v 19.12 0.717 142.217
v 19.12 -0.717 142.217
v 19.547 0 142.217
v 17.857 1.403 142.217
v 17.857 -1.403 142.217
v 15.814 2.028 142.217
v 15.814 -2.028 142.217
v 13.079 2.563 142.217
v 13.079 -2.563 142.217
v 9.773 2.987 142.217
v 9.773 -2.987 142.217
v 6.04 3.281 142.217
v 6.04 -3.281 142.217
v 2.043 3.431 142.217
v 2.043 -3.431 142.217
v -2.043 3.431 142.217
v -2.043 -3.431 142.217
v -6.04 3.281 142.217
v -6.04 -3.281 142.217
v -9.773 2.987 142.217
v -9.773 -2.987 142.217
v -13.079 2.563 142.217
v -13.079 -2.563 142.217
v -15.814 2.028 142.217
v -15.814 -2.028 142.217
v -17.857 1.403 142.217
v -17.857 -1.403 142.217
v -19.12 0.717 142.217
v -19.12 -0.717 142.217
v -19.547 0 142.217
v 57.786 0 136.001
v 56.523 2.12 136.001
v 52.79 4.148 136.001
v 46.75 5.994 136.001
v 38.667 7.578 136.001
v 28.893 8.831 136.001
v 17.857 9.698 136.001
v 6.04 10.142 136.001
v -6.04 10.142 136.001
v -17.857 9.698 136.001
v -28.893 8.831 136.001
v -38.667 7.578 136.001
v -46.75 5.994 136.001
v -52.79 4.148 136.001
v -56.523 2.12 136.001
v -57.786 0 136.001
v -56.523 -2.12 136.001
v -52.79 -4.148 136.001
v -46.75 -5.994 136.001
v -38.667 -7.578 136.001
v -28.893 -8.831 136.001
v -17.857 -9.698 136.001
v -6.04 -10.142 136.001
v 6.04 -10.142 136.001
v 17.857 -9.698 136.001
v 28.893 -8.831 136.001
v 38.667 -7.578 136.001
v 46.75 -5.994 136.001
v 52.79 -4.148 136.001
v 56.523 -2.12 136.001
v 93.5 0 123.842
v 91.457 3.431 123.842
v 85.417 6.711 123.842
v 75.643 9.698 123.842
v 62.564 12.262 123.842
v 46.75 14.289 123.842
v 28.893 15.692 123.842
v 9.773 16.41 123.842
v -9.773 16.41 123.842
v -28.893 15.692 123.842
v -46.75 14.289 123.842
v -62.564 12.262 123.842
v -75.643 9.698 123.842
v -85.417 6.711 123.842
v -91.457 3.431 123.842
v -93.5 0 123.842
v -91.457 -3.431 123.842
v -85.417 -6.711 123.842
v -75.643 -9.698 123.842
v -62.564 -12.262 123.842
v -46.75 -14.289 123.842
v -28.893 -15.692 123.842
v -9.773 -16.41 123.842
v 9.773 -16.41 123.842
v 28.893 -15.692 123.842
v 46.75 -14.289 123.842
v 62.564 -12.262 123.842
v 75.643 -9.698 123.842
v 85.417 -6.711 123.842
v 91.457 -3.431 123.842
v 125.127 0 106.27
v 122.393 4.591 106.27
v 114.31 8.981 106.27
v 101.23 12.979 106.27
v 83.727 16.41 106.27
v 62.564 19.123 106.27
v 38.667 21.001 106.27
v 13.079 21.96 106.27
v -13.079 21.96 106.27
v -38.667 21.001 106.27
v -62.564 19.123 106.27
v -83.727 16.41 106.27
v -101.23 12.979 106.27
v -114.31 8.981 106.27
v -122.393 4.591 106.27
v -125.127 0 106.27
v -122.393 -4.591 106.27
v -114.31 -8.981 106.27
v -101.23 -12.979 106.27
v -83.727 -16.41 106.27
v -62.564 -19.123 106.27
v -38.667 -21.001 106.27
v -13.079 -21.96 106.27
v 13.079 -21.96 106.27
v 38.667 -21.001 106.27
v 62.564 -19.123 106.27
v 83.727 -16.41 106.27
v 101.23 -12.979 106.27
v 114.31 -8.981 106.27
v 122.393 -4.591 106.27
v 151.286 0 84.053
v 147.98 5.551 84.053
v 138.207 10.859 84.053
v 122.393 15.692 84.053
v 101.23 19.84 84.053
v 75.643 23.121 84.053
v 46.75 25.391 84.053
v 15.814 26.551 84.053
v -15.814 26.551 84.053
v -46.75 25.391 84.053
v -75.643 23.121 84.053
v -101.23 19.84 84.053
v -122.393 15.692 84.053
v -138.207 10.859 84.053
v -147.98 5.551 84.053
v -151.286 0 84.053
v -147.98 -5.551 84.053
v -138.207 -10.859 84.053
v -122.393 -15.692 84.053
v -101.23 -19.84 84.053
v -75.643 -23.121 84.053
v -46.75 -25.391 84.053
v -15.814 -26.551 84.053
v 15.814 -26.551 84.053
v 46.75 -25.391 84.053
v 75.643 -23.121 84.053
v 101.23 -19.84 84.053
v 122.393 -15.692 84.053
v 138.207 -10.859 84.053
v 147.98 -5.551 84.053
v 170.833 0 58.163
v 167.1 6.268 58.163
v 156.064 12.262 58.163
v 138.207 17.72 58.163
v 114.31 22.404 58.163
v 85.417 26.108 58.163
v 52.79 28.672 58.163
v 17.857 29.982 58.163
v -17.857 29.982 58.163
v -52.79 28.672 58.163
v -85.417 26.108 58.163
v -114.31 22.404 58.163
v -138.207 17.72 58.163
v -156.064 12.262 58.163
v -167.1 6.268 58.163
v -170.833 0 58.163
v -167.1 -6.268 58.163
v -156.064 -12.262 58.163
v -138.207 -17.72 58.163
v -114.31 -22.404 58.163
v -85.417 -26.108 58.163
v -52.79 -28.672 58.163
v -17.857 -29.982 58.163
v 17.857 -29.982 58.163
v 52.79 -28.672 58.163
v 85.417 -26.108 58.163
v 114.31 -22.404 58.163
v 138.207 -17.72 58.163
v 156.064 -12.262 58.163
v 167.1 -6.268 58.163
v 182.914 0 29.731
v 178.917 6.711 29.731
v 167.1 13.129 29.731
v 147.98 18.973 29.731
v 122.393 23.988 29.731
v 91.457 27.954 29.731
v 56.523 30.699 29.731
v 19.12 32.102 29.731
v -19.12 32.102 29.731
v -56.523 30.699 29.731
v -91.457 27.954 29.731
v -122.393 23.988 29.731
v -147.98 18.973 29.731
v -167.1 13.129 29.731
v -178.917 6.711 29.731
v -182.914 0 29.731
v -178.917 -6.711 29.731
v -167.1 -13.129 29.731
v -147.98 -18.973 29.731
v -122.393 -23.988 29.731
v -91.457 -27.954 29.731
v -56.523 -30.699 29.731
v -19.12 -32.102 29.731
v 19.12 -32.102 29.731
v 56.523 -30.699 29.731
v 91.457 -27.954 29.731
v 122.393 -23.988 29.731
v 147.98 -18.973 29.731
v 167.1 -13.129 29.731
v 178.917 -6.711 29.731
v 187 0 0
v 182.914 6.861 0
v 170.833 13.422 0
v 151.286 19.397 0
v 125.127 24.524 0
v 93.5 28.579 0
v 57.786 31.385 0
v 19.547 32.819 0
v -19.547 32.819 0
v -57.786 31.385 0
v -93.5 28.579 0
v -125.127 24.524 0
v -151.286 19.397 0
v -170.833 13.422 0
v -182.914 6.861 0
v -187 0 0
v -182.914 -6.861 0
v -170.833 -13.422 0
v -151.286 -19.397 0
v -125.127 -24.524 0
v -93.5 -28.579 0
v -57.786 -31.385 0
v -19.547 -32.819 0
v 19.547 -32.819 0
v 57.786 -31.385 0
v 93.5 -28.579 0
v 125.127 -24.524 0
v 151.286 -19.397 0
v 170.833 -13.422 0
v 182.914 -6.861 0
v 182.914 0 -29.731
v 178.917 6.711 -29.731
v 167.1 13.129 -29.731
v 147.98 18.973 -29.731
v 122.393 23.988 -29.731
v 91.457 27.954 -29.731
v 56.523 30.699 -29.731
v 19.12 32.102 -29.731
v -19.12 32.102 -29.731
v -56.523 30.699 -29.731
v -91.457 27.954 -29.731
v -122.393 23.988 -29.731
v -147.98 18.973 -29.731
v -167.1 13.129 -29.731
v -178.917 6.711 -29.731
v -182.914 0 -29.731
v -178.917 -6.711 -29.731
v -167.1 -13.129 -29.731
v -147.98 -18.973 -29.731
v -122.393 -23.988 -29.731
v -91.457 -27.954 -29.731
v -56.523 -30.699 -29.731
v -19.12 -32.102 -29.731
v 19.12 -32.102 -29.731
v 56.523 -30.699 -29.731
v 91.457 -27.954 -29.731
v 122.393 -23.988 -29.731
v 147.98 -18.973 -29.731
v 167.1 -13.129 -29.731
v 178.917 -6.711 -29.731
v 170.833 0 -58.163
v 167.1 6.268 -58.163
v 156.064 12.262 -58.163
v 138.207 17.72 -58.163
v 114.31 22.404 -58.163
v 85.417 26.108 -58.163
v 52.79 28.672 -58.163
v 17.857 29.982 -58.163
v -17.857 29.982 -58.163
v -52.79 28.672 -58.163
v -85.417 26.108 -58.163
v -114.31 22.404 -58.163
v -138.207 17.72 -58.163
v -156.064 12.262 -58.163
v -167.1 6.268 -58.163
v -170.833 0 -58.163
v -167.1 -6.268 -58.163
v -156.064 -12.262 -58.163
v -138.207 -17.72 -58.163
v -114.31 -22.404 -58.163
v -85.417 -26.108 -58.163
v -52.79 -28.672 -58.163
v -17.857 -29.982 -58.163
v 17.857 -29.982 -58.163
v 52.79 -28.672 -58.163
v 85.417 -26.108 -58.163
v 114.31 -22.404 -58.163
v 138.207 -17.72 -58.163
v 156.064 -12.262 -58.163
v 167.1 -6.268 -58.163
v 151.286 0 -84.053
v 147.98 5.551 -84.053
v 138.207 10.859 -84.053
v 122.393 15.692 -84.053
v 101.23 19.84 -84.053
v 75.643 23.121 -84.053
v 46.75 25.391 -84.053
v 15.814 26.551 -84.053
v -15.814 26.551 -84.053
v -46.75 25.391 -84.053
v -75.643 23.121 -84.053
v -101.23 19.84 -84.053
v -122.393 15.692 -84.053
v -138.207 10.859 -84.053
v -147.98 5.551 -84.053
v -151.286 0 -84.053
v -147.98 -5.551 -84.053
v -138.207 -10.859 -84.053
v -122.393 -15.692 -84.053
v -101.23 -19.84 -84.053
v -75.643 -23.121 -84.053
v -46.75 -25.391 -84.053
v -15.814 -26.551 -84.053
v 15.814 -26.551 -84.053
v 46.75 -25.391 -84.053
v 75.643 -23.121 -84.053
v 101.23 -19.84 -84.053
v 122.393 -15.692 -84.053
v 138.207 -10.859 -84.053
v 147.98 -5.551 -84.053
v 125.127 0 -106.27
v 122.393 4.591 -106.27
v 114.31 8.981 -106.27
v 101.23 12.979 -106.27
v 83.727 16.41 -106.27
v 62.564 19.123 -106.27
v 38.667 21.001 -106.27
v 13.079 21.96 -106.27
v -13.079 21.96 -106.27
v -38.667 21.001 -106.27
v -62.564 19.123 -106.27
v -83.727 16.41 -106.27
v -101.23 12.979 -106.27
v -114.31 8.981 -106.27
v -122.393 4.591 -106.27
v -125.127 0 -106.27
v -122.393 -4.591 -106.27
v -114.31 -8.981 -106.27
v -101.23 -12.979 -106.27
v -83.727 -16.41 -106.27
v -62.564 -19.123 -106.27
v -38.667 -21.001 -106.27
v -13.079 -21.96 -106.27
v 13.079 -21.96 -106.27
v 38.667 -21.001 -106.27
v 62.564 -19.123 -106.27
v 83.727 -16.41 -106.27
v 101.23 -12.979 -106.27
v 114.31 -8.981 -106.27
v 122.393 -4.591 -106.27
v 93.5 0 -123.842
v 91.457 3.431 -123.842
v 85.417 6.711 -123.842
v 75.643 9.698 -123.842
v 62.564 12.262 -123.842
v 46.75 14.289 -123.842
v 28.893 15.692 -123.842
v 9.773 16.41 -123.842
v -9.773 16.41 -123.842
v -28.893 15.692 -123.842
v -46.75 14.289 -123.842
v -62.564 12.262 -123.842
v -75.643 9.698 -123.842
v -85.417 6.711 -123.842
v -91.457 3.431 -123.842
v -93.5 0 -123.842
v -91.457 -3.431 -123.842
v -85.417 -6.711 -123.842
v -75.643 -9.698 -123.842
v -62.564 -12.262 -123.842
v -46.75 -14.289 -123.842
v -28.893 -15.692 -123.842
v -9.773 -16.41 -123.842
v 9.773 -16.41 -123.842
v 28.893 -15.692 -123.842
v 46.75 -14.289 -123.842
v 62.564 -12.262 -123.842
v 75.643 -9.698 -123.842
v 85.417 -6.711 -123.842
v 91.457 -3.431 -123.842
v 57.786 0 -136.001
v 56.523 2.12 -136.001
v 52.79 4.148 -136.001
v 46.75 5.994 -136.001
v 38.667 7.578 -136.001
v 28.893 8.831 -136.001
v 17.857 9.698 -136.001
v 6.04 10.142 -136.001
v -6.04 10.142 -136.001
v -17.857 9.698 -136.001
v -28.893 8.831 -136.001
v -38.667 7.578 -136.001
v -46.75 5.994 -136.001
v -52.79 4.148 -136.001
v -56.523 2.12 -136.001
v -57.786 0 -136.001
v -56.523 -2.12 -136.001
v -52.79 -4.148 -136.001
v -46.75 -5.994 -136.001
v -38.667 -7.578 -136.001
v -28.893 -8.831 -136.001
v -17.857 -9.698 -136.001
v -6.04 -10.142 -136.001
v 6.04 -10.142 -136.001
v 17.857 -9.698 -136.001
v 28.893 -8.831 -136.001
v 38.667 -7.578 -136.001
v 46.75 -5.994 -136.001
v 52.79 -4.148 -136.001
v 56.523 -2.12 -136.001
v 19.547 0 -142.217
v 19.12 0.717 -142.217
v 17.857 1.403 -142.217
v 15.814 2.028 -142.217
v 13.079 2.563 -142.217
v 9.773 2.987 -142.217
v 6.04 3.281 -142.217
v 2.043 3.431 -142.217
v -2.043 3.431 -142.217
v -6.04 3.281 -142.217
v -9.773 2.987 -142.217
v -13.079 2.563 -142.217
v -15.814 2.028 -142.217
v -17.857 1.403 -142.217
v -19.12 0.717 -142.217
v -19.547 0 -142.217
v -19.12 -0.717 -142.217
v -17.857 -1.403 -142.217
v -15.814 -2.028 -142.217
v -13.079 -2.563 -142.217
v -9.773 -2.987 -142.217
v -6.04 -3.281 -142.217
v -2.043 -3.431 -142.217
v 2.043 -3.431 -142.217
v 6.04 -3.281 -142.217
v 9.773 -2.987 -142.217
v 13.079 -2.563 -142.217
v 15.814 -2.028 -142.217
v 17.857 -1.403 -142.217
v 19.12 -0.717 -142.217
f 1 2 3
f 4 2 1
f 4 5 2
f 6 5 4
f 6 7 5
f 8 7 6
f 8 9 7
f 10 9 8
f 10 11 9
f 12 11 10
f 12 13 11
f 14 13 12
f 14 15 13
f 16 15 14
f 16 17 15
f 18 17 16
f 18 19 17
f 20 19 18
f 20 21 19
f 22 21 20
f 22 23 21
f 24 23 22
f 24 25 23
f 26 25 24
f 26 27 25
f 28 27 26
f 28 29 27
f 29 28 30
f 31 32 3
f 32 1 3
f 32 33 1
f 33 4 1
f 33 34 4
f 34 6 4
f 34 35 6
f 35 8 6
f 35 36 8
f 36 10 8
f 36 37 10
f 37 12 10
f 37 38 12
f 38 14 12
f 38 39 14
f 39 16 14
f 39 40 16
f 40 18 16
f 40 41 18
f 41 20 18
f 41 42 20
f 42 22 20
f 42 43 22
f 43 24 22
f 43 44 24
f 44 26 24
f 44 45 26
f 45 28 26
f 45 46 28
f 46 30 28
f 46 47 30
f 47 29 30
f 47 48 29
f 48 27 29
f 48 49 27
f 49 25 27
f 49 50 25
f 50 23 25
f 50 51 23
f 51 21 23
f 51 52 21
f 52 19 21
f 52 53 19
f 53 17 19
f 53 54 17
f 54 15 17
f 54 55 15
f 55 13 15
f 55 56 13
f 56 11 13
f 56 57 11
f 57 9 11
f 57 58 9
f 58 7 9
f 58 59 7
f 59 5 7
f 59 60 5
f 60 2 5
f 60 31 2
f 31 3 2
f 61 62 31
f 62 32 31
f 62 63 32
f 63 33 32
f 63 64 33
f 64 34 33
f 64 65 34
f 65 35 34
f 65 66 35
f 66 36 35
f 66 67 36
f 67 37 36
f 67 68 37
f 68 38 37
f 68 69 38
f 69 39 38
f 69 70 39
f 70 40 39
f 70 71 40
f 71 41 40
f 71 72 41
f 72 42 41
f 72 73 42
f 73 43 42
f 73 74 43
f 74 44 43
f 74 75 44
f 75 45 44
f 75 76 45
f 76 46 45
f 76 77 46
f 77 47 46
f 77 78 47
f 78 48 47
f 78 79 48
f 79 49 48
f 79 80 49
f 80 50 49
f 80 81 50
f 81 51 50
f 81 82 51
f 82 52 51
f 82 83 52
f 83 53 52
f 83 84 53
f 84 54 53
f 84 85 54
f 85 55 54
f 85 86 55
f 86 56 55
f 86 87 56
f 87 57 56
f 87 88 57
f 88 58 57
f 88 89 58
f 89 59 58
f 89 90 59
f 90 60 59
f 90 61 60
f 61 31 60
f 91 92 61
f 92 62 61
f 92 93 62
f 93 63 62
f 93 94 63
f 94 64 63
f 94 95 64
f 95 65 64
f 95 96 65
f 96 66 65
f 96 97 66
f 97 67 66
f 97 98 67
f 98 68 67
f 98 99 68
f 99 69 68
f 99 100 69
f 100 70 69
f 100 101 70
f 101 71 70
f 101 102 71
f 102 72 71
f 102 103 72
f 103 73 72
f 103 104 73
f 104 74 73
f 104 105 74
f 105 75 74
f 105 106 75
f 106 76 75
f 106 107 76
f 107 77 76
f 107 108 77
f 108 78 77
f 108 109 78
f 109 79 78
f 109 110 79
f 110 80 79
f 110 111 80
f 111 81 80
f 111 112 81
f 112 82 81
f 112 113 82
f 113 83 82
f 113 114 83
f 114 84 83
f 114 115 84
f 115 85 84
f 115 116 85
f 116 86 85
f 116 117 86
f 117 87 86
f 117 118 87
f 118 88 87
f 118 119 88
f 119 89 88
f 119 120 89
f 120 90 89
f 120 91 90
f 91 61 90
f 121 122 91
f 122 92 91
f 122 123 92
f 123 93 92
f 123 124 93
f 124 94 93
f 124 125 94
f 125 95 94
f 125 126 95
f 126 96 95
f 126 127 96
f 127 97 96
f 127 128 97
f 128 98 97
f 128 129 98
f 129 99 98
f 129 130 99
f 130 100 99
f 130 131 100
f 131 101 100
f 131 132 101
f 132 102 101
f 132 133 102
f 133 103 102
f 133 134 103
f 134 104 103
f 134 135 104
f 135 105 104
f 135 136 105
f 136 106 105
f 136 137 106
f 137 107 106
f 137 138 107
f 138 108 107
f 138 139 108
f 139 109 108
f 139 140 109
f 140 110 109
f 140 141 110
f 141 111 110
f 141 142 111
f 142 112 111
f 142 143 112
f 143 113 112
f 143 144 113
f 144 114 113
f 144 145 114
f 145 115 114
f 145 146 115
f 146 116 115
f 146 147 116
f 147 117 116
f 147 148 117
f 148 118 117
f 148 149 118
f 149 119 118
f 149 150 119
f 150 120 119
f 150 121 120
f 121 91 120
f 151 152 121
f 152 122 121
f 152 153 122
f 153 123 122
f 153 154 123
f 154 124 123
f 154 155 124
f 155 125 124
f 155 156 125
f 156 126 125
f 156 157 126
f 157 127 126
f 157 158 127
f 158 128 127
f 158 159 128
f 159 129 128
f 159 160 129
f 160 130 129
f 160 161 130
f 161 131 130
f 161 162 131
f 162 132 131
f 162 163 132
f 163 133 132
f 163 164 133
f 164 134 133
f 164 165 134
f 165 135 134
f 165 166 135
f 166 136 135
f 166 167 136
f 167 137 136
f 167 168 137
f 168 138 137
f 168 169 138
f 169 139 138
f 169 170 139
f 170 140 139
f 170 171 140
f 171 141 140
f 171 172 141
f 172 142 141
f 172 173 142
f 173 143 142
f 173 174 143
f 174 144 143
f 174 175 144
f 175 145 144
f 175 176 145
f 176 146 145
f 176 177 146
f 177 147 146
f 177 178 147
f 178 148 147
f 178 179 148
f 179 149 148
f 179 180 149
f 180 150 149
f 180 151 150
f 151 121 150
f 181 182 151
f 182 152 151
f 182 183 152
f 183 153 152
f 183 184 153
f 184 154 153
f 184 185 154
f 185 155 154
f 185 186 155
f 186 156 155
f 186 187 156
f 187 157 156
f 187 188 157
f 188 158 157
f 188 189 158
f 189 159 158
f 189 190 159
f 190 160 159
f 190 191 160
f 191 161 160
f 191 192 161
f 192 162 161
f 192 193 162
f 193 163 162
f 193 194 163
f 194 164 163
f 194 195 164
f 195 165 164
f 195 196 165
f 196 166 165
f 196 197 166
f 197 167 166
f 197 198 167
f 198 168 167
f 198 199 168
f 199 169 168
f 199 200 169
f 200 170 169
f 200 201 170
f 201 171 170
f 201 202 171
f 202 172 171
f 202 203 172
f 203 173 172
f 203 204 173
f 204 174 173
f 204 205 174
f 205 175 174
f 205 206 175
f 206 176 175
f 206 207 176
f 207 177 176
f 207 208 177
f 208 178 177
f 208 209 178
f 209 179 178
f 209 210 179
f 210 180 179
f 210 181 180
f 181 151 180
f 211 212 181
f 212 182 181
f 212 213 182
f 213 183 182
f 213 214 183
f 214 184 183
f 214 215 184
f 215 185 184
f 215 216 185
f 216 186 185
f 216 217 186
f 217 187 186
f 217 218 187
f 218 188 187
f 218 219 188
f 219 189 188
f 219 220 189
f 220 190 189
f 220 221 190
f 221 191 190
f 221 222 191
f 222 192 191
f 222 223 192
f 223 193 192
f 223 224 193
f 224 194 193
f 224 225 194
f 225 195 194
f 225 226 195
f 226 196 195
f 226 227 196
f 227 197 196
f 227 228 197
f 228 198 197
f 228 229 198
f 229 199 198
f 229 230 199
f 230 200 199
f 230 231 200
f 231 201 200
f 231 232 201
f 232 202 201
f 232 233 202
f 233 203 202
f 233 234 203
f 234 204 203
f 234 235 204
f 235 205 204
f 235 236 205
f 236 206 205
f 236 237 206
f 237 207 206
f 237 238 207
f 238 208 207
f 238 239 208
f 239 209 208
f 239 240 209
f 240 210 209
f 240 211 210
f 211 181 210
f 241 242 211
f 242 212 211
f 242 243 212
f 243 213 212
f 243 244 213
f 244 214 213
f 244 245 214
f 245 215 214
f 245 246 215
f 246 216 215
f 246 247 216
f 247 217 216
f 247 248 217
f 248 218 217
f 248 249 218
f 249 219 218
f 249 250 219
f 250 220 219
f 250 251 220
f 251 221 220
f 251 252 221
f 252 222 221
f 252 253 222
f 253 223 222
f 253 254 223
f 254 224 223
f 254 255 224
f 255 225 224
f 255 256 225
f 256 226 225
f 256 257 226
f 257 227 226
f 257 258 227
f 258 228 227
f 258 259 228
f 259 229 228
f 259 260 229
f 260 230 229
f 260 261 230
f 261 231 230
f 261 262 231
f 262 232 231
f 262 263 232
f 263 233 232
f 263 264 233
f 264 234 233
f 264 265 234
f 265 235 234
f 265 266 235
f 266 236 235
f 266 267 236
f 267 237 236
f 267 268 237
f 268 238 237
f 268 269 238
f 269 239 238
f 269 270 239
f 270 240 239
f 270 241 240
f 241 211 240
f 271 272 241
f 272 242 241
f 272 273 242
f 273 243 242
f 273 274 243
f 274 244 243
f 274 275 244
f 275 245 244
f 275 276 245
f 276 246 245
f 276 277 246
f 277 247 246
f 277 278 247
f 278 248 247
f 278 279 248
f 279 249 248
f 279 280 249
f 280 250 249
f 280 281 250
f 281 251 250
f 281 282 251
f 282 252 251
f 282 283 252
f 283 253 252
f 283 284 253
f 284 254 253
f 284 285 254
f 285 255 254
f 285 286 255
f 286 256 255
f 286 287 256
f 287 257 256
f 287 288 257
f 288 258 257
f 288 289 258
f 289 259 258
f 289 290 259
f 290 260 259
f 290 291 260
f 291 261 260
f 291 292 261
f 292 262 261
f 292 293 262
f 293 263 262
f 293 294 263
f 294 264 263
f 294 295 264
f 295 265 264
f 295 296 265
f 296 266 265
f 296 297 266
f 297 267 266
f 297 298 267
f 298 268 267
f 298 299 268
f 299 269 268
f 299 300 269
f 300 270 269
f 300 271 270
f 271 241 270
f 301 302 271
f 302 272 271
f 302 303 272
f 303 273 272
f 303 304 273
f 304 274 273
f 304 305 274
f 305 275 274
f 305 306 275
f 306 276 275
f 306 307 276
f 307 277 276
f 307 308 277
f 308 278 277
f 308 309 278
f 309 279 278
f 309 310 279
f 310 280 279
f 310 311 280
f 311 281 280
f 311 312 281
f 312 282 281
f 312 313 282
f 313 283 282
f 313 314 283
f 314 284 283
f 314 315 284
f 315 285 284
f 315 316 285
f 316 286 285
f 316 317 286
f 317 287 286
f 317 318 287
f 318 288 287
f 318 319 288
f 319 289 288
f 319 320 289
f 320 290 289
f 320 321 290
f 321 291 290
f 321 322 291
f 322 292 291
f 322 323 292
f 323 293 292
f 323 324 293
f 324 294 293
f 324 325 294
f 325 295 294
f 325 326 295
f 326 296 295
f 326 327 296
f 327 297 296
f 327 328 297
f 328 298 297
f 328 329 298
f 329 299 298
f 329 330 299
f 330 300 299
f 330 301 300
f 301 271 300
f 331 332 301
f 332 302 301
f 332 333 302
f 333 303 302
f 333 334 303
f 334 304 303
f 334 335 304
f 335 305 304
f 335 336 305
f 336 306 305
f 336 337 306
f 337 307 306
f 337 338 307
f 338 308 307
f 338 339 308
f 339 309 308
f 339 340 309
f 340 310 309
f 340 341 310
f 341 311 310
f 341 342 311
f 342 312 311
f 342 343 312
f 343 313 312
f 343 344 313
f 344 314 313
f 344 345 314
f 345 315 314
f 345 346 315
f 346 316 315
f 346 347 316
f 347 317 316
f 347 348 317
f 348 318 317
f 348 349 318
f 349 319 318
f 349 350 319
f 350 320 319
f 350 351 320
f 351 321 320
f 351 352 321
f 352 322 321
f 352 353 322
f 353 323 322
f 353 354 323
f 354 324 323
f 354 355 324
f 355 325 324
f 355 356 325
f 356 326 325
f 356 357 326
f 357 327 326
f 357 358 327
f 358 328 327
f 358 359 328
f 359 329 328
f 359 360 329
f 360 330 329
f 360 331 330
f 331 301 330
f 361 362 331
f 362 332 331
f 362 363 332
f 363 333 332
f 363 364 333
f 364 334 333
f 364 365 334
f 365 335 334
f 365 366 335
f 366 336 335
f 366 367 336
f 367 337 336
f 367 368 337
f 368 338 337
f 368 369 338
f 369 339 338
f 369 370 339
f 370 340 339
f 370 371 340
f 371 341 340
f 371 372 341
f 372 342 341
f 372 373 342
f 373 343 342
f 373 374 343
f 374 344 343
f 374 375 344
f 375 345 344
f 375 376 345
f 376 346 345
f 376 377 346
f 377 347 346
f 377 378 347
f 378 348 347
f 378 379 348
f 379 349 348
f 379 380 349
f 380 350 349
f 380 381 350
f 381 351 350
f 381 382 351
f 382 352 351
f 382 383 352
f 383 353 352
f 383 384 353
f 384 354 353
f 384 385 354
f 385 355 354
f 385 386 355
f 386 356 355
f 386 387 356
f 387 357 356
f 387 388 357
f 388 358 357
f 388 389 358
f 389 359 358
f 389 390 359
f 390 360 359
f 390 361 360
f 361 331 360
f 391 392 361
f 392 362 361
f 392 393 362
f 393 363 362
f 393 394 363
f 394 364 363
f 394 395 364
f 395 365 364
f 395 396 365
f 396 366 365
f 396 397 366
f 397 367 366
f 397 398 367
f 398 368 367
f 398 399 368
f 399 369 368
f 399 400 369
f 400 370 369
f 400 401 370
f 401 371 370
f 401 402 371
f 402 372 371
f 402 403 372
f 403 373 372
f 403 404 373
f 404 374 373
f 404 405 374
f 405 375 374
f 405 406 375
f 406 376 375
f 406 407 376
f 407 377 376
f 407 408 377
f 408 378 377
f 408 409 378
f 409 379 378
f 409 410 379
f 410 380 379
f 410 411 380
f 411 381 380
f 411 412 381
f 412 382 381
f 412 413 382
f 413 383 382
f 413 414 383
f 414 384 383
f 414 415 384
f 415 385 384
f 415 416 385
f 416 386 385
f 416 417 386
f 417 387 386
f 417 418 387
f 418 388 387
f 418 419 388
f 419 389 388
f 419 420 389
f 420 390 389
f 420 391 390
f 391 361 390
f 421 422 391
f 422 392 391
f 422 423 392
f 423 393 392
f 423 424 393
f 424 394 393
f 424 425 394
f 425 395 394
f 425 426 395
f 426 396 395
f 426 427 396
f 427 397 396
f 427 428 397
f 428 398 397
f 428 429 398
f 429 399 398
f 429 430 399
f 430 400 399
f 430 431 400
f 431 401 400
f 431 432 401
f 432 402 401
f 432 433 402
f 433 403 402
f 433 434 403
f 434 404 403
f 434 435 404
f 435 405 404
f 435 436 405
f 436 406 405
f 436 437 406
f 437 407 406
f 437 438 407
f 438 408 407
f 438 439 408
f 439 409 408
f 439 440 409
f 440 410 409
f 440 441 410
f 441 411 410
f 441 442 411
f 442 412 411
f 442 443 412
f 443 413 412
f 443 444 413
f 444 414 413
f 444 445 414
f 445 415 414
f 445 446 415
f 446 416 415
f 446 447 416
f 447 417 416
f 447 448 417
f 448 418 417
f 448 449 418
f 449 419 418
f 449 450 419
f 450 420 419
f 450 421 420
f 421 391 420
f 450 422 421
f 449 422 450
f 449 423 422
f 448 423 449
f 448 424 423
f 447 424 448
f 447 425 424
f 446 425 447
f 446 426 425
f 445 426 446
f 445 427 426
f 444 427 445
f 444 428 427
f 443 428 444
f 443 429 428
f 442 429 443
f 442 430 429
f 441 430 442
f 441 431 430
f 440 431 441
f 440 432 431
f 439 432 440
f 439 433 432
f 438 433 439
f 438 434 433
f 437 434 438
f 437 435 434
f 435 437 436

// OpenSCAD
// Generated by SolidPython 1.0.1 on 2020-07-29 00:46:52


scale(v = [17, 3, 13]) {
	sphere(r = 11);
}
/***********************************************
*********      SolidPython code:      **********
************************************************
 
# import packages: SolidPython
from solid import *
from solid.utils import *
from itertools import chain, combinations, permutations


class Resize:

    def __init__(self, scad_file):
        self.scad_file = scad_file
        #self.scad_file = import_scad(scad_file)
        # cone/cylinder param:
        self.r1 = 0
        self.r2 = 0
        self.h = 0
        # rectangular prism param:
        self.w = 0
        self.l = 0
        # ellipse param:
        self.r = 0

    # import OpenScad code (file name corresponds to shape)


    # classify shape + parameters
    def assign(self, param1, param2, param3):
        if self.scad_file == 'cone.scad':
            self.r1 = param1
            self.r2 = param2
            self.h = param3
        elif self.scad_file == 'cylinder.scad':
            self.r1 = param1
            self.r2 = param2
            self.h = param3
        elif self.scad_file == 'rectangularPrism.scad':
            self.h = param1
            self.l = param2
            self.w = param3
        else:
            self.r = param1
            self.h = param2

    # resize parameters
    def iterate(self):
        x = range(3, 20, 2)
        i = 1
        if self.scad_file == 'cone.scad':
            tempList = list(permutations(x, 2))
            for temp in tempList:
                param1 = temp[0]
                param2 = temp[1]
                filepath = 'produced_scad_files/' + 'cone' + str(param1) + '_' + str(param2) + '_' + '.scad'
                scad_render_to_file(cylinder(h=param1, r1=param2, r2=0), filepath)

        elif self.scad_file == 'cylinder.scad':
            tempList = list(permutations(x, 3))
            for temp in tempList:
                param1 = temp[0]
                param2 = temp[1]
                filepath = 'produced_scad_files/' + 'cylinder' + str(param1) + '_' + str(param2) + '_' + '.scad'
                scad_render_to_file(cylinder(h=param1, r1=param2, r2=param2), filepath)

        elif self.scad_file == 'rectangularPrism.scad':
            tempList = list(permutations(x, 3))
            for temp in tempList:
                param1 = temp[0]
                param2 = temp[1]
                param3 = temp[2]
                filepath = 'produced_scad_files/' + 'rectangularPrism' + str(param1) + '_' + str(param2) + '_' + str(
                    param3) + '.scad'
                scad_render_to_file(cube(size=(param1, param2, param3)), filepath)

        elif self.scad_file == 'ellipse.scad':
            tempList = list(permutations(x, 4))
            for temp in tempList:
                param1 = temp[0]
                param2 = temp[1]
                param3 = temp[2]
                param4 = temp[3]
                filepath = 'produced_scad_files/' + 'ellipse' + str(param1) + '_' + str(param2) + '_' + str(param3) + '_' + str(param4) + '.scad'
                scad_render_to_file(scale([param1, param2, param3])(sphere(r=param4)), filepath)

    def render_to_scadfile(self):
        scad_render_to_file(scad, 'example.scad') 
 
************************************************/
